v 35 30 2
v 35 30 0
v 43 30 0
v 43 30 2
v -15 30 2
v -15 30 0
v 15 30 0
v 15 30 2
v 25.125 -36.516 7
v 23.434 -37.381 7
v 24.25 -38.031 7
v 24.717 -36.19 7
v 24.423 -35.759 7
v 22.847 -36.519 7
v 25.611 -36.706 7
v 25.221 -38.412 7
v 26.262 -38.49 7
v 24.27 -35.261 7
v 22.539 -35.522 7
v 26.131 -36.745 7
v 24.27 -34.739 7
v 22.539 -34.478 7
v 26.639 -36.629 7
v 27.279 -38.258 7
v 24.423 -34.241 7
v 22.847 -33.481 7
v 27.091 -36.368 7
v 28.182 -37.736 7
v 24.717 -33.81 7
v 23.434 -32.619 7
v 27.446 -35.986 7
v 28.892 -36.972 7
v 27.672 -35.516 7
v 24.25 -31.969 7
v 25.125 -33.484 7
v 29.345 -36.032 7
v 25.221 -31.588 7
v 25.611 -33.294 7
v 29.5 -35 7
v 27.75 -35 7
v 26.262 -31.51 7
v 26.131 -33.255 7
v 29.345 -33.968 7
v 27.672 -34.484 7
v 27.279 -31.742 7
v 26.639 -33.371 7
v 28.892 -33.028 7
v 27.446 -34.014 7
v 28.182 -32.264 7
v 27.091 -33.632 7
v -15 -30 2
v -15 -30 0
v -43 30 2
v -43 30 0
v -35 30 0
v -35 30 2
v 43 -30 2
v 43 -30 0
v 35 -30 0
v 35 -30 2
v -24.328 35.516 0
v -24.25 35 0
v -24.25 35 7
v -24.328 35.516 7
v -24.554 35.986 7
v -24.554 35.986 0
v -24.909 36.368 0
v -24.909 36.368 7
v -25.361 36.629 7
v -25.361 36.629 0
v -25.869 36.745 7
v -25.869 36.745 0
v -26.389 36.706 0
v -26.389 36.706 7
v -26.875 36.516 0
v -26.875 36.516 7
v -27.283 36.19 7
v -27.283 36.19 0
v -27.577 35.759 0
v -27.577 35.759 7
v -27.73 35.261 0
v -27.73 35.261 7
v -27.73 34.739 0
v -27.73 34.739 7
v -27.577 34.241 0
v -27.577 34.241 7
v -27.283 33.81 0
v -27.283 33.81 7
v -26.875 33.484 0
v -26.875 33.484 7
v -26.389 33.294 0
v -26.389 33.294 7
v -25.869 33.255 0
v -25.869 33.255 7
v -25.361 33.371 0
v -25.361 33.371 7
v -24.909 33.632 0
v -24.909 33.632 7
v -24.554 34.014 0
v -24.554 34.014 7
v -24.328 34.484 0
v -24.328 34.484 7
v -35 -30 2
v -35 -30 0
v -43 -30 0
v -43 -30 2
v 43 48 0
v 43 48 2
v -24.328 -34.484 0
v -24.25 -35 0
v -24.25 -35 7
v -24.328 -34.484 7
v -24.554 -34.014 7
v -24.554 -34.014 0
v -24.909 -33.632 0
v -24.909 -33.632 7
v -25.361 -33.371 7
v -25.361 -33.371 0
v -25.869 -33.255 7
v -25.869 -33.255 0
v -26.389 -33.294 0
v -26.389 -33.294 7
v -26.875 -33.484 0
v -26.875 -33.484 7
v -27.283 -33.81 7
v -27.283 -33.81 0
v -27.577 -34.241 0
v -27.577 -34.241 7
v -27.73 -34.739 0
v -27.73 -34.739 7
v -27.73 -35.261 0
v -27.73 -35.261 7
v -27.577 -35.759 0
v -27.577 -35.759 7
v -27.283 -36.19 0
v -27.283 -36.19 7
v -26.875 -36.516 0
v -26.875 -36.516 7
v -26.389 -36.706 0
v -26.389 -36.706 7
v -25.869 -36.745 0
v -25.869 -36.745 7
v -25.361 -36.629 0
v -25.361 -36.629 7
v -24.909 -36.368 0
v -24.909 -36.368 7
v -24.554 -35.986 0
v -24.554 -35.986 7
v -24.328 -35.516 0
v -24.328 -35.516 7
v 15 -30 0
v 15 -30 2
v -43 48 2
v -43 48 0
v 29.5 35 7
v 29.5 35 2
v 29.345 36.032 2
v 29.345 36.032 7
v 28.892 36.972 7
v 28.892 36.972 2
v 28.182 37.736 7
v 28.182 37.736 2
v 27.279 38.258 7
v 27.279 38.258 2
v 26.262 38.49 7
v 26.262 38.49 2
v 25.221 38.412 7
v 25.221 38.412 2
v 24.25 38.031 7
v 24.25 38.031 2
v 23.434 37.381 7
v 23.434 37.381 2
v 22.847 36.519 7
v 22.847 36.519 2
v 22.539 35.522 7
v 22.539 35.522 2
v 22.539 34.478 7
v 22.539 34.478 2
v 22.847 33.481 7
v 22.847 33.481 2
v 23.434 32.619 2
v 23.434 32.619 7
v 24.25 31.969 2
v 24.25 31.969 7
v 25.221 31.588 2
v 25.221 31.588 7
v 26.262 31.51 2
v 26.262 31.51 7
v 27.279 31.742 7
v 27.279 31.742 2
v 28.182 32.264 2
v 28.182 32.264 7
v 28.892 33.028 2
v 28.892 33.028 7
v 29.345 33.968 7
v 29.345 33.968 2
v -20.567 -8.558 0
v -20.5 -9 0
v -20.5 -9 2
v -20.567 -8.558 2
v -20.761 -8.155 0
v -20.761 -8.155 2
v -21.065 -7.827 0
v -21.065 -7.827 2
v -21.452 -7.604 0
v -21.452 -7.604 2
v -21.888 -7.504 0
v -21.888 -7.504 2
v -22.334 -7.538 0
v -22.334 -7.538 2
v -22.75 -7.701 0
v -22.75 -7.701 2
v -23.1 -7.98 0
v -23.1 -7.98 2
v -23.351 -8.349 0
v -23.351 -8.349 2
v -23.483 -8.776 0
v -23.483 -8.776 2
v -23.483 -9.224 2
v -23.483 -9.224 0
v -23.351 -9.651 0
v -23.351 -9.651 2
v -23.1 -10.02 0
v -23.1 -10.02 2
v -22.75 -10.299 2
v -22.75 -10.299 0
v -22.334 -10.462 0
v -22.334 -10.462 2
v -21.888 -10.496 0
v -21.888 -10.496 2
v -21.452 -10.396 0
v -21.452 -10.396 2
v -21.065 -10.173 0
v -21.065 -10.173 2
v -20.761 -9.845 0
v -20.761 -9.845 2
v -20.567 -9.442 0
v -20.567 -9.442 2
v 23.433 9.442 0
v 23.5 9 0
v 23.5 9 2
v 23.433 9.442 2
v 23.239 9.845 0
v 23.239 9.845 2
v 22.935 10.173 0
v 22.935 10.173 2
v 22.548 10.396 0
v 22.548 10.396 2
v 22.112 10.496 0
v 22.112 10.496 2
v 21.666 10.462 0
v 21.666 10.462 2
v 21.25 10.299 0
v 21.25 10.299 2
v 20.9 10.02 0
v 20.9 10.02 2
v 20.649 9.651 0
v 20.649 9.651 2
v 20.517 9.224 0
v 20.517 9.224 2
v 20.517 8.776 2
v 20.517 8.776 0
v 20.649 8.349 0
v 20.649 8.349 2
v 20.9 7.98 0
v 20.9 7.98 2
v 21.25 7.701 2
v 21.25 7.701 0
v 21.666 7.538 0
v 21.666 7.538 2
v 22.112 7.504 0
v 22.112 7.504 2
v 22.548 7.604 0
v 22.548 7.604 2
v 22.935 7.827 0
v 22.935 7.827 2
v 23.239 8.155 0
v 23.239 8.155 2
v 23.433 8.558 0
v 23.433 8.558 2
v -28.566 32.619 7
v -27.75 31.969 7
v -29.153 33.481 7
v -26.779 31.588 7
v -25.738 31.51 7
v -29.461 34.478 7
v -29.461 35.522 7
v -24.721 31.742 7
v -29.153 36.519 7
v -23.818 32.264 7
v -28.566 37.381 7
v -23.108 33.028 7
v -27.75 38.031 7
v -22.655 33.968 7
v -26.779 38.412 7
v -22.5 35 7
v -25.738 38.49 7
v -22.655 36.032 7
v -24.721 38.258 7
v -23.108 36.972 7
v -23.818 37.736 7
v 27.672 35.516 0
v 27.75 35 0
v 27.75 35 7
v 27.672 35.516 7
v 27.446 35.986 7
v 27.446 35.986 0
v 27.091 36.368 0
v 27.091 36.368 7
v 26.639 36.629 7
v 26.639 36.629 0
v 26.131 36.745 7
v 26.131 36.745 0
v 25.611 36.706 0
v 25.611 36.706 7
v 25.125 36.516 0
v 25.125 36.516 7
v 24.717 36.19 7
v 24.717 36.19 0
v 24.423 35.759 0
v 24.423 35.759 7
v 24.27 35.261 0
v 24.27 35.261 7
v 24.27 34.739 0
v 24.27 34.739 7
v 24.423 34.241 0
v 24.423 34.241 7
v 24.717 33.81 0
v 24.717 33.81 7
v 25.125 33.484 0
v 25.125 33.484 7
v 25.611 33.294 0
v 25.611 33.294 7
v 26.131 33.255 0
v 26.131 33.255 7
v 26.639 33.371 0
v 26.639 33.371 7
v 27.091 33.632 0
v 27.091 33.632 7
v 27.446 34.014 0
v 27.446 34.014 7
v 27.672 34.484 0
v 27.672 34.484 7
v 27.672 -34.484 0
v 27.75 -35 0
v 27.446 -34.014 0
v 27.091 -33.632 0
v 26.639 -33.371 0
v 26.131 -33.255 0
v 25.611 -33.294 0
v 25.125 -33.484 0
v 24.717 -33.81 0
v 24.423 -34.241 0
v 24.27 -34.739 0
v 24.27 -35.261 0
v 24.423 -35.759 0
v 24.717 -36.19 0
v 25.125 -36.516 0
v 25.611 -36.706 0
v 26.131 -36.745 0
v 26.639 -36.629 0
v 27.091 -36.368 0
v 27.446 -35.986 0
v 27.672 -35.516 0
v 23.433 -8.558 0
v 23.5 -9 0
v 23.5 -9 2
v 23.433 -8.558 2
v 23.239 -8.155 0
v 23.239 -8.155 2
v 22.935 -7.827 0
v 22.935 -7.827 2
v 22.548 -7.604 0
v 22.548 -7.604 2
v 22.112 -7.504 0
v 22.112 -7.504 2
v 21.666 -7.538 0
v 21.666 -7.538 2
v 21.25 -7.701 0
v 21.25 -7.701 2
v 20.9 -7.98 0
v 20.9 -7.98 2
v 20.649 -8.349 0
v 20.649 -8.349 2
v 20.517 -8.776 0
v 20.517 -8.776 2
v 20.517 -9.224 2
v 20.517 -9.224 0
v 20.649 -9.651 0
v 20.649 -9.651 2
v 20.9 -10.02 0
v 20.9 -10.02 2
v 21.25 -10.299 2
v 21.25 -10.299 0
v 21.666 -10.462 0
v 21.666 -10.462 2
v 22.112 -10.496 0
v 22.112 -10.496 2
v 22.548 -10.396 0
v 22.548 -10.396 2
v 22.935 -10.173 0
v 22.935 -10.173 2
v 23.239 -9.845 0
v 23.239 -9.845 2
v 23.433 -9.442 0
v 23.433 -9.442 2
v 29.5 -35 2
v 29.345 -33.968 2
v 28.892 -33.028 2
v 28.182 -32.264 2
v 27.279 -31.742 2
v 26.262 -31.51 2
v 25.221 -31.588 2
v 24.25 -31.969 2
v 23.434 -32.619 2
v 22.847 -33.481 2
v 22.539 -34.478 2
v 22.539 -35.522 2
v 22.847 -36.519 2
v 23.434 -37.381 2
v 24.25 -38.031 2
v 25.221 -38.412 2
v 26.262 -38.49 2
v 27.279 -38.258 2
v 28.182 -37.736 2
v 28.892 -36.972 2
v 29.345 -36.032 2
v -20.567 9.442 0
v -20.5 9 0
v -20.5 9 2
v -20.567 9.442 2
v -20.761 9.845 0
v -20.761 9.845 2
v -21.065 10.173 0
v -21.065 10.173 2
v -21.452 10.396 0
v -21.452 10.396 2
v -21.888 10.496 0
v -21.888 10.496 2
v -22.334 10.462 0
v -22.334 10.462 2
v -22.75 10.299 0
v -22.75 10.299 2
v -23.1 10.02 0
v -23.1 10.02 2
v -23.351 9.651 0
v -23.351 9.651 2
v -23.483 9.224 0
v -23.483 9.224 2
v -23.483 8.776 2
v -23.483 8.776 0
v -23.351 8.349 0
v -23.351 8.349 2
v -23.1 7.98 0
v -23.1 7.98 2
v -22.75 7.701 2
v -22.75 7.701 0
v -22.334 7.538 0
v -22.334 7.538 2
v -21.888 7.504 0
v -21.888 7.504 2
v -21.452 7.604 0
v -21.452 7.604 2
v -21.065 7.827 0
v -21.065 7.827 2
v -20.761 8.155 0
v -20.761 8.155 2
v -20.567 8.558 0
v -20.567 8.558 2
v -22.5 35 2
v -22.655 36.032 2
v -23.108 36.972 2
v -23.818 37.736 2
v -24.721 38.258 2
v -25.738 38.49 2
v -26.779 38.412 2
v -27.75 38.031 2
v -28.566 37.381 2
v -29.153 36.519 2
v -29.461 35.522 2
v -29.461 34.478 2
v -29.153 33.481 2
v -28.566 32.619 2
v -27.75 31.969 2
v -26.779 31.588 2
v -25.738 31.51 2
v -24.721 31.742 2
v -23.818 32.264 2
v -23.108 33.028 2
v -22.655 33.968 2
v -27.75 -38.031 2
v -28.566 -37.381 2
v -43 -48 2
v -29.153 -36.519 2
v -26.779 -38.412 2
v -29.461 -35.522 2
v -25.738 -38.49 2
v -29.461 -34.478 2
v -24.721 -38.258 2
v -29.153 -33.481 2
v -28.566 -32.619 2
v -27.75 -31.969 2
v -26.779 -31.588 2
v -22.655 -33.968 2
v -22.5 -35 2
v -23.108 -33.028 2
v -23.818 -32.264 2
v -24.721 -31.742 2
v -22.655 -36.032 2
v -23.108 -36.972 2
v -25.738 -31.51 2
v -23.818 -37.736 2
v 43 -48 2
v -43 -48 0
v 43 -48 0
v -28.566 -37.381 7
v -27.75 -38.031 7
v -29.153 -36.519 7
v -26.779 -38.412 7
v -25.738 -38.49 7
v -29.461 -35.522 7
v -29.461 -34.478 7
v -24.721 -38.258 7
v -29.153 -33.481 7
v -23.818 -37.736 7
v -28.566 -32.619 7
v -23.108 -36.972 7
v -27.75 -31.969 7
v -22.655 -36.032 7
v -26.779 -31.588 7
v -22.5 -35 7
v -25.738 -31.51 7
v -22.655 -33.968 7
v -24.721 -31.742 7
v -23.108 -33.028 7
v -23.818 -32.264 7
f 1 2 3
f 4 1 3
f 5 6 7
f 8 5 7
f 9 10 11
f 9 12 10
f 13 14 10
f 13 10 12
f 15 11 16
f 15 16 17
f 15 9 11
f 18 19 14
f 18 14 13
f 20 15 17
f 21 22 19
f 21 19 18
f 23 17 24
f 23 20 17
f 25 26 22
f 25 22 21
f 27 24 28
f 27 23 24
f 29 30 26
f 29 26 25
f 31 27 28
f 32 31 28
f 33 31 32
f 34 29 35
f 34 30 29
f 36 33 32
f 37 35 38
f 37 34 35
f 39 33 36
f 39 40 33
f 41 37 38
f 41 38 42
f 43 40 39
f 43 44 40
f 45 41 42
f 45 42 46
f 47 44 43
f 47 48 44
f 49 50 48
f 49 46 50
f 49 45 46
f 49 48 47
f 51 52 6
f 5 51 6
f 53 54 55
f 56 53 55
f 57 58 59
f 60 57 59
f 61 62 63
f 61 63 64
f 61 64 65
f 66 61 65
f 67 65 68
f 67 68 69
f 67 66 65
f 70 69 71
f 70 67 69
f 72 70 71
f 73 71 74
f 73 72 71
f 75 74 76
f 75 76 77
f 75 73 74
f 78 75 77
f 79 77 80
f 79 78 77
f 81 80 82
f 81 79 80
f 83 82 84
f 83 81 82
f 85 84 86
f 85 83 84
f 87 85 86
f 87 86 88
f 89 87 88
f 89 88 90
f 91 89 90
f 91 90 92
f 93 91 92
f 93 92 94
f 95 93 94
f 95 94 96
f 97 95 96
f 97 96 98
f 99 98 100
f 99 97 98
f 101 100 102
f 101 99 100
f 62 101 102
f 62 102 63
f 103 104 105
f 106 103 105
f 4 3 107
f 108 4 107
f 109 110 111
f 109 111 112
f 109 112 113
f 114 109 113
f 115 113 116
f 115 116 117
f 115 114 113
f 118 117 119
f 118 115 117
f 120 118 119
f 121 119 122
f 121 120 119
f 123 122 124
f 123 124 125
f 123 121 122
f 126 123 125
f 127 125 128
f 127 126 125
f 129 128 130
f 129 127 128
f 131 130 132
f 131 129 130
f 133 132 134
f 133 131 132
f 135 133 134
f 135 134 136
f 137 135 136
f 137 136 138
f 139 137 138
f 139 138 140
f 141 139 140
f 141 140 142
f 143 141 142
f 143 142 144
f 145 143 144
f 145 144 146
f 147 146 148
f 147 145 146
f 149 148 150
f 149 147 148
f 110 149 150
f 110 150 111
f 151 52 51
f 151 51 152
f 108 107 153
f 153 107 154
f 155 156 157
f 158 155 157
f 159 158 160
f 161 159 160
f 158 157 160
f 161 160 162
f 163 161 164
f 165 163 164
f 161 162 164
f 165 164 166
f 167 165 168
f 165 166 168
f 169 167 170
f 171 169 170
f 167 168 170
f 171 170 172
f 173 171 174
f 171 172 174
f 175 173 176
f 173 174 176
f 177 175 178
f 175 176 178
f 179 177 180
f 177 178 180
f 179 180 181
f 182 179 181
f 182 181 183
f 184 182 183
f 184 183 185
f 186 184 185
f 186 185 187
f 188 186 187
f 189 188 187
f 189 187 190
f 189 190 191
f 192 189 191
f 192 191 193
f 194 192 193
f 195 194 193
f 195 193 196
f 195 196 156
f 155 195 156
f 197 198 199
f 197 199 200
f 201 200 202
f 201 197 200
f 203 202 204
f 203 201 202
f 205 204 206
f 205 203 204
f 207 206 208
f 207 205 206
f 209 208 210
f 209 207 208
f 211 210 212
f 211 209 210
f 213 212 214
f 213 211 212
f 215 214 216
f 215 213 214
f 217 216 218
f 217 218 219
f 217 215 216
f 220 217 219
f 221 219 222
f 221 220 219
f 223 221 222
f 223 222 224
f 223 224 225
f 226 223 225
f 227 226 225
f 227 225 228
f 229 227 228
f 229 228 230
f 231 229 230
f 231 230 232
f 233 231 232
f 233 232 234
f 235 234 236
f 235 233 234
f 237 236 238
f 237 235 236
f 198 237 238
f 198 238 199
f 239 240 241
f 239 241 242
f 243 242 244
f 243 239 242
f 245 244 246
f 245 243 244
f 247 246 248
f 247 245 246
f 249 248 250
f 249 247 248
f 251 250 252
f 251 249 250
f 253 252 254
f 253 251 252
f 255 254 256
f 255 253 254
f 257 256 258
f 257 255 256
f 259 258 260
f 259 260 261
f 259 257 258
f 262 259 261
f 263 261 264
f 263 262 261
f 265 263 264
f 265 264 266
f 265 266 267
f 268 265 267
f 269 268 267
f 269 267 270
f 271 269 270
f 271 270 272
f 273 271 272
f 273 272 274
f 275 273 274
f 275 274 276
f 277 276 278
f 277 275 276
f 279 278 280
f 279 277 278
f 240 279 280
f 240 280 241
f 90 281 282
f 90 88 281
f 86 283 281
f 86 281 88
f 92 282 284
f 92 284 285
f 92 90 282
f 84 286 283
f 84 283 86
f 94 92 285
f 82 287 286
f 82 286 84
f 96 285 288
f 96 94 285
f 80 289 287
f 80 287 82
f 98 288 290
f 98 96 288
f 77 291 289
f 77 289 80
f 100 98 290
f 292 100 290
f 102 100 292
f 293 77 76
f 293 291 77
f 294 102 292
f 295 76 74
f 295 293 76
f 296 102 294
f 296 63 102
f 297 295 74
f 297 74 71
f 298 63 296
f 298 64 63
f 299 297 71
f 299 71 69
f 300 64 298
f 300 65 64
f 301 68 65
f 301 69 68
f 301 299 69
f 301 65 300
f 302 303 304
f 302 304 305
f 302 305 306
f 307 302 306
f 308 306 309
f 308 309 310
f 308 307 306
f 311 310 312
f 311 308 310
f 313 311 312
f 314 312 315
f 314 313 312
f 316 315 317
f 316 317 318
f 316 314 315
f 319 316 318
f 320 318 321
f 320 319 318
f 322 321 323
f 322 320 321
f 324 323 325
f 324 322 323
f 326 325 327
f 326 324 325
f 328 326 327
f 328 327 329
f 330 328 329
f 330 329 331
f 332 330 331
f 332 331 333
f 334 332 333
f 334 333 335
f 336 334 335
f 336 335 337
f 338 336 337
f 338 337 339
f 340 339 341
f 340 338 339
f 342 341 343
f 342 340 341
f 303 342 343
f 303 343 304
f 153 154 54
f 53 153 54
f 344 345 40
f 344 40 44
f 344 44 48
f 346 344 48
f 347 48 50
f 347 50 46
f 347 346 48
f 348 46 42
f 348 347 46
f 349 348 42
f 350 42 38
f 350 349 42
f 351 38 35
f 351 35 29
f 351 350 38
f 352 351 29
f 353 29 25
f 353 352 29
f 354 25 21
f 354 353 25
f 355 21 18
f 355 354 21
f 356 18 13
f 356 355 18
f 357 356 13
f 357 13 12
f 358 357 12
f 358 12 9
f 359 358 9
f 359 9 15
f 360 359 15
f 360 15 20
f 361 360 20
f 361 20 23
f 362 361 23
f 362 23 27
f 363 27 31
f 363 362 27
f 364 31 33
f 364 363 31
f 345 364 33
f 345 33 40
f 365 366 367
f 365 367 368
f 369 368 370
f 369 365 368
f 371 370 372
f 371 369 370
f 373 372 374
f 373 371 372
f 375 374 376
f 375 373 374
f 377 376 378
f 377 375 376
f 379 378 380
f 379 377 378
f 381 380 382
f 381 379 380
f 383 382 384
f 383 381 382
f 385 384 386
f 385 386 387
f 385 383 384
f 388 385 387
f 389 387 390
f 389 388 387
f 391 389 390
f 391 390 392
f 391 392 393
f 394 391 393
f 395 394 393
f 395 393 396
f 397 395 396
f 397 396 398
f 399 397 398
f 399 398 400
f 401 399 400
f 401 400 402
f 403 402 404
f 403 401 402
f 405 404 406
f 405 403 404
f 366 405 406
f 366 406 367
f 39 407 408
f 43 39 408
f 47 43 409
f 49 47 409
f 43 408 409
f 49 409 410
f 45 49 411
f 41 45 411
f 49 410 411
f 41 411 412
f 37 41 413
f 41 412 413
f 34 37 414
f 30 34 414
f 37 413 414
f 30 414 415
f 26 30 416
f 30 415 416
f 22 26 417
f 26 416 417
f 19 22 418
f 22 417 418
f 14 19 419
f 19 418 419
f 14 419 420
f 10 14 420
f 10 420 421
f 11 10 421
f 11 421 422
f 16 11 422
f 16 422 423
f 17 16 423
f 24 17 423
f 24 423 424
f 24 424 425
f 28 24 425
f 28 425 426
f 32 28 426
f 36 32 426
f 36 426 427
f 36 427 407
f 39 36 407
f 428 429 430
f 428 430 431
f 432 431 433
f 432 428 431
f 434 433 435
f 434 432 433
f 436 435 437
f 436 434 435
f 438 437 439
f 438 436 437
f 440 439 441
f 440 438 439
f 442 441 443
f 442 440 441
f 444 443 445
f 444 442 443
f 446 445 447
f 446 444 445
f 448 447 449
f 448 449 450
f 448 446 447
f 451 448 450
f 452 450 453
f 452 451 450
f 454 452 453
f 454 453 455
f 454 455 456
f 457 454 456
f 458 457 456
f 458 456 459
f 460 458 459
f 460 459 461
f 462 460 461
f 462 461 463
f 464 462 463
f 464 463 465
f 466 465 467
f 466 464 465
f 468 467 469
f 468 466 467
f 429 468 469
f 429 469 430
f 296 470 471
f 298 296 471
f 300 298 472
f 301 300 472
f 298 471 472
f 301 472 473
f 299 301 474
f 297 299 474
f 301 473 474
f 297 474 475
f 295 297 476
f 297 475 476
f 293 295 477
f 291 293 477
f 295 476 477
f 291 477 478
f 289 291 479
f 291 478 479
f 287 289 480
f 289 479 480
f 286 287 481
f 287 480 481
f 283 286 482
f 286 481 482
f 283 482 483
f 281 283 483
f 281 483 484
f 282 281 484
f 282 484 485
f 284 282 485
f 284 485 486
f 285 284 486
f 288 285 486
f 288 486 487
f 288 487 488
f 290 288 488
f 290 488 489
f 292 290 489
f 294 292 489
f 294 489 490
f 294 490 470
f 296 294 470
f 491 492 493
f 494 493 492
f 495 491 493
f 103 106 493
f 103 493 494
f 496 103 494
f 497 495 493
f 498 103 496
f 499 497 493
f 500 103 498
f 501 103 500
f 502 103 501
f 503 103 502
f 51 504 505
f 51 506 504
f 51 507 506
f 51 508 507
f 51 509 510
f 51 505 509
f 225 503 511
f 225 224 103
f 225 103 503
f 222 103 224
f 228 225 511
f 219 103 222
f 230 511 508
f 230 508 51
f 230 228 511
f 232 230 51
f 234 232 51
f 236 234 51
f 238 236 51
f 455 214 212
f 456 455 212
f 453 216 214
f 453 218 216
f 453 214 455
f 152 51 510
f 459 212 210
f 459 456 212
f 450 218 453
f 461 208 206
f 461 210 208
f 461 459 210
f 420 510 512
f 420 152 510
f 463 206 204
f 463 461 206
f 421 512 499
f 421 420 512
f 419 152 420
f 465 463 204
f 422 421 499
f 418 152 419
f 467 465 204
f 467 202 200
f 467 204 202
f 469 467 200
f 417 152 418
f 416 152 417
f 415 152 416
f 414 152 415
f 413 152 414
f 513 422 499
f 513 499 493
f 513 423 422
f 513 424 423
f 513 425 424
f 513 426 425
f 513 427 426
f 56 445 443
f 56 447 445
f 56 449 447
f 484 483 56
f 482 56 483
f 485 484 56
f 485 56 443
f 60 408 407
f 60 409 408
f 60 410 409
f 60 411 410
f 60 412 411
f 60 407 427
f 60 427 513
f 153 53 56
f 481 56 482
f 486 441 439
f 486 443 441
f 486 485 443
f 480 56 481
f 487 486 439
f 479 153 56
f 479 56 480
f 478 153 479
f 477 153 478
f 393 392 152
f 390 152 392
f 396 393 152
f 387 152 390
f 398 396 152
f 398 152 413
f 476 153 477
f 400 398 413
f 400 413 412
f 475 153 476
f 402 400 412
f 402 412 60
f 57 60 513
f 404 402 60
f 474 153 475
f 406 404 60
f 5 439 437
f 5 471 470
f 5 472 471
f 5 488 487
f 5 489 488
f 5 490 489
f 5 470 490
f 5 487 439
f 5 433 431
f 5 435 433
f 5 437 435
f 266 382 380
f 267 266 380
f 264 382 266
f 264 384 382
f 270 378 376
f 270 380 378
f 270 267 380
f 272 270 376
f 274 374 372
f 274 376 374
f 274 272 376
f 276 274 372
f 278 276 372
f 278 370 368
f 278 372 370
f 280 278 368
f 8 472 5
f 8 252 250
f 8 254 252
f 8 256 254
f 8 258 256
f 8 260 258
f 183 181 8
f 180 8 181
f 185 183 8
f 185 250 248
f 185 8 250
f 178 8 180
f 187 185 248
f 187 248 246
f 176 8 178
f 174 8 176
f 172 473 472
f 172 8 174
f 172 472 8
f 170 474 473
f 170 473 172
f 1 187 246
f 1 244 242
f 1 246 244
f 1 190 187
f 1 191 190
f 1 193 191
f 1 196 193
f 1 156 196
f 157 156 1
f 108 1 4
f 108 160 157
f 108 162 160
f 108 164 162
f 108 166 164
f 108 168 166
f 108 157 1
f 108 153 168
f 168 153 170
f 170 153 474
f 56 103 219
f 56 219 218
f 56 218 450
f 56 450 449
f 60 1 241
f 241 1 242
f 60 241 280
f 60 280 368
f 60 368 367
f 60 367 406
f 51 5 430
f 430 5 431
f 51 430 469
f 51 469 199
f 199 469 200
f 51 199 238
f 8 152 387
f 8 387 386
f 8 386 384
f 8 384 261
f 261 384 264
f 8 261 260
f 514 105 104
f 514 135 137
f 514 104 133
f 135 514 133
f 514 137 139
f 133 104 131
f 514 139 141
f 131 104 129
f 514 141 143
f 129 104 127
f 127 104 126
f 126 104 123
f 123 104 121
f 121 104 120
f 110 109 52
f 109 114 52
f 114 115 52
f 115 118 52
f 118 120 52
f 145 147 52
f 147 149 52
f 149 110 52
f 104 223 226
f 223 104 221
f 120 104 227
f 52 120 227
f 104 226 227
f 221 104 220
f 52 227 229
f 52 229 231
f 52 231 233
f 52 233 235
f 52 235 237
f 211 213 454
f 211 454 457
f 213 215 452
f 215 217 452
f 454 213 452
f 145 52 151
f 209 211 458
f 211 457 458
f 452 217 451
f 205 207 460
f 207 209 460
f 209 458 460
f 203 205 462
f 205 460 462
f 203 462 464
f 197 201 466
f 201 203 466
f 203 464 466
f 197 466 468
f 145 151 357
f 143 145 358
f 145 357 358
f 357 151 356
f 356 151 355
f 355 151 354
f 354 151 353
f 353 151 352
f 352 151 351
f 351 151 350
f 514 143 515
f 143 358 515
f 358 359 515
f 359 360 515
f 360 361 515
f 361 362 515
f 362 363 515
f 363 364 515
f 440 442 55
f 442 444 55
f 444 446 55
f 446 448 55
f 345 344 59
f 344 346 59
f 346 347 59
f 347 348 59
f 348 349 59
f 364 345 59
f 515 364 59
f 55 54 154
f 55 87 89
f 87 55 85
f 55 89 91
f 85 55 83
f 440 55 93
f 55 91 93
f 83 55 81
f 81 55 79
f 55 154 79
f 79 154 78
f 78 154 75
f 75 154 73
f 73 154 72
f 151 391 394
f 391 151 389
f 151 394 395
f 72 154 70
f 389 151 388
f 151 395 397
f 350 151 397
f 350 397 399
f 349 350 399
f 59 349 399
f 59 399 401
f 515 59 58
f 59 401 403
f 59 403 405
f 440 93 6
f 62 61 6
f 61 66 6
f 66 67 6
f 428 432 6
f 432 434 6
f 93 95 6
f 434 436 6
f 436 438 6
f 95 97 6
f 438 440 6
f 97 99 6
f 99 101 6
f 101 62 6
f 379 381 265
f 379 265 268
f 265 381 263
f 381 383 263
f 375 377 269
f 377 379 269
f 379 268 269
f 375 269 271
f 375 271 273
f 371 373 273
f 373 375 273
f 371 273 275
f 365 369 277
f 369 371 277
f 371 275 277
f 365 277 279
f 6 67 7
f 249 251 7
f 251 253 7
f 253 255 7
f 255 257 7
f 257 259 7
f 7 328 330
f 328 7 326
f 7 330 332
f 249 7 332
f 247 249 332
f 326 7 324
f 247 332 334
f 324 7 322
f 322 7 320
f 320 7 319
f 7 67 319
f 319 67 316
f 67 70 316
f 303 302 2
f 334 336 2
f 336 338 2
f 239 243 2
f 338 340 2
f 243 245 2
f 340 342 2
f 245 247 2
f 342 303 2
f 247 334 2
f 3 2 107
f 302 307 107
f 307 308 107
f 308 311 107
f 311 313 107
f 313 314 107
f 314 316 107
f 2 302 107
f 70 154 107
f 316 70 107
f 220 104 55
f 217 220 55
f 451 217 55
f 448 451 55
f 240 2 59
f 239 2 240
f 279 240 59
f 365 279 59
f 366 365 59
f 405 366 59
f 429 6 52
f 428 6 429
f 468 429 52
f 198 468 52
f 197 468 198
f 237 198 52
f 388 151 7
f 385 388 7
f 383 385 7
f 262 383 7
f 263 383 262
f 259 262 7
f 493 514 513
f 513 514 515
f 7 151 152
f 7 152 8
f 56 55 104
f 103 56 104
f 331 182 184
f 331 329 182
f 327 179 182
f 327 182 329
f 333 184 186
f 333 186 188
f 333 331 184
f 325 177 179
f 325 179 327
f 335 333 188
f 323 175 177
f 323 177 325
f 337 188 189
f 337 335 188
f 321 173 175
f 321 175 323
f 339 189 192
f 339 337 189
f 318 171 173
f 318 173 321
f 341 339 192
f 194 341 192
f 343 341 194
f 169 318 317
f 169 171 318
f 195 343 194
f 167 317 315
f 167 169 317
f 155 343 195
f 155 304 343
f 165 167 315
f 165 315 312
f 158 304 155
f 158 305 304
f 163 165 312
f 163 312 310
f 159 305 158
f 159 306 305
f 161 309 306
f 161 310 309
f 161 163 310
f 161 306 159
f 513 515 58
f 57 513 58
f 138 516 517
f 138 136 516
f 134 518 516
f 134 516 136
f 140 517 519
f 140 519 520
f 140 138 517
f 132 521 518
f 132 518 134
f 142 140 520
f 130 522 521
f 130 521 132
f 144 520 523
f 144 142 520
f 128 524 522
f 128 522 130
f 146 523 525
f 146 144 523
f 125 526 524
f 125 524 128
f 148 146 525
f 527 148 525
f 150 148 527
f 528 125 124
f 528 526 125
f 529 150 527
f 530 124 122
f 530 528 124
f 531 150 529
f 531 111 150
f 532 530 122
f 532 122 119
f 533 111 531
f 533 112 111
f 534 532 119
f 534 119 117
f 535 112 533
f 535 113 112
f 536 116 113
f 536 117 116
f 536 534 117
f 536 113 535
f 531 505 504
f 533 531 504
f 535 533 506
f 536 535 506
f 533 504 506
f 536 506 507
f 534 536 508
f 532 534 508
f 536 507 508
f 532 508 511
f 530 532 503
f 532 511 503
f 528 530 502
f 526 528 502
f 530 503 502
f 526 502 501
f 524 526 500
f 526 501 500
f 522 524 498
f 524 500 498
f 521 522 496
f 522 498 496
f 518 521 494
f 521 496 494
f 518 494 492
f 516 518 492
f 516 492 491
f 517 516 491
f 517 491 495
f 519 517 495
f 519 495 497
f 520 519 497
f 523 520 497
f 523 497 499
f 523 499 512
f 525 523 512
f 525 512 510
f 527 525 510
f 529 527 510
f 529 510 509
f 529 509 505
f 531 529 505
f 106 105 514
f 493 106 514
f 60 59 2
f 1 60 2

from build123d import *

# Parameters (mm, degrees)
F0_R     = 3.5
F0_R_2   = 1.5
F0_W     = 30
F0_H     = 60
F1_DEPTH = 2
F0_R_3   = 1.75
F2_DEPTH = 7


with BuildPart() as f1:
    # F0 (on Top) → F1 (new body)
    with BuildSketch(Plane.XY):
        Polygon((43, 30), (43, 48), (35, 48), (-35, 48), (-43, 48), (-43, 30), (-35, 30), (-35, 0), (-35, -30), (-43, -30), (-43, -48), (-35, -48), (35, -48), (43, -48), (43, -30), (35, -30), (35, 0), (35, 30), align=None)
        with Locations((-26, -35)):
            Circle(F0_R, mode=Mode.SUBTRACT)
        with Locations((-22, -9)):
            Circle(F0_R_2, mode=Mode.SUBTRACT)
        with Locations((26, -35)):
            Circle(F0_R, mode=Mode.SUBTRACT)
        with Locations((22, -9)):
            Circle(F0_R_2, mode=Mode.SUBTRACT)
        with Locations((-22, 9)):
            Circle(F0_R_2, mode=Mode.SUBTRACT)
        with Locations((-26, 35)):
            Circle(F0_R, mode=Mode.SUBTRACT)
        Rectangle(F0_W, F0_H, mode=Mode.SUBTRACT)
        with Locations((22, 9)):
            Circle(F0_R_2, mode=Mode.SUBTRACT)
        with Locations((26, 35)):
            Circle(F0_R, mode=Mode.SUBTRACT)
    extrude(amount=F1_DEPTH)

    # F0 (on Top) → F2 (join)
    with BuildSketch(Plane.XY):
        with Locations((-26, 35)):
            Circle(F0_R)
        with Locations((-26, 35)):
            Circle(F0_R_3, mode=Mode.SUBTRACT)
        with Locations((26, 35)):
            Circle(F0_R)
        with Locations((26, 35)):
            Circle(F0_R_3, mode=Mode.SUBTRACT)
        with Locations((26, -35)):
            Circle(F0_R)
        with Locations((26, -35)):
            Circle(F0_R_3, mode=Mode.SUBTRACT)
        with Locations((-26, -35)):
            Circle(F0_R)
        with Locations((-26, -35)):
            Circle(F0_R_3, mode=Mode.SUBTRACT)
    extrude(amount=F2_DEPTH)


solid = f1.part
